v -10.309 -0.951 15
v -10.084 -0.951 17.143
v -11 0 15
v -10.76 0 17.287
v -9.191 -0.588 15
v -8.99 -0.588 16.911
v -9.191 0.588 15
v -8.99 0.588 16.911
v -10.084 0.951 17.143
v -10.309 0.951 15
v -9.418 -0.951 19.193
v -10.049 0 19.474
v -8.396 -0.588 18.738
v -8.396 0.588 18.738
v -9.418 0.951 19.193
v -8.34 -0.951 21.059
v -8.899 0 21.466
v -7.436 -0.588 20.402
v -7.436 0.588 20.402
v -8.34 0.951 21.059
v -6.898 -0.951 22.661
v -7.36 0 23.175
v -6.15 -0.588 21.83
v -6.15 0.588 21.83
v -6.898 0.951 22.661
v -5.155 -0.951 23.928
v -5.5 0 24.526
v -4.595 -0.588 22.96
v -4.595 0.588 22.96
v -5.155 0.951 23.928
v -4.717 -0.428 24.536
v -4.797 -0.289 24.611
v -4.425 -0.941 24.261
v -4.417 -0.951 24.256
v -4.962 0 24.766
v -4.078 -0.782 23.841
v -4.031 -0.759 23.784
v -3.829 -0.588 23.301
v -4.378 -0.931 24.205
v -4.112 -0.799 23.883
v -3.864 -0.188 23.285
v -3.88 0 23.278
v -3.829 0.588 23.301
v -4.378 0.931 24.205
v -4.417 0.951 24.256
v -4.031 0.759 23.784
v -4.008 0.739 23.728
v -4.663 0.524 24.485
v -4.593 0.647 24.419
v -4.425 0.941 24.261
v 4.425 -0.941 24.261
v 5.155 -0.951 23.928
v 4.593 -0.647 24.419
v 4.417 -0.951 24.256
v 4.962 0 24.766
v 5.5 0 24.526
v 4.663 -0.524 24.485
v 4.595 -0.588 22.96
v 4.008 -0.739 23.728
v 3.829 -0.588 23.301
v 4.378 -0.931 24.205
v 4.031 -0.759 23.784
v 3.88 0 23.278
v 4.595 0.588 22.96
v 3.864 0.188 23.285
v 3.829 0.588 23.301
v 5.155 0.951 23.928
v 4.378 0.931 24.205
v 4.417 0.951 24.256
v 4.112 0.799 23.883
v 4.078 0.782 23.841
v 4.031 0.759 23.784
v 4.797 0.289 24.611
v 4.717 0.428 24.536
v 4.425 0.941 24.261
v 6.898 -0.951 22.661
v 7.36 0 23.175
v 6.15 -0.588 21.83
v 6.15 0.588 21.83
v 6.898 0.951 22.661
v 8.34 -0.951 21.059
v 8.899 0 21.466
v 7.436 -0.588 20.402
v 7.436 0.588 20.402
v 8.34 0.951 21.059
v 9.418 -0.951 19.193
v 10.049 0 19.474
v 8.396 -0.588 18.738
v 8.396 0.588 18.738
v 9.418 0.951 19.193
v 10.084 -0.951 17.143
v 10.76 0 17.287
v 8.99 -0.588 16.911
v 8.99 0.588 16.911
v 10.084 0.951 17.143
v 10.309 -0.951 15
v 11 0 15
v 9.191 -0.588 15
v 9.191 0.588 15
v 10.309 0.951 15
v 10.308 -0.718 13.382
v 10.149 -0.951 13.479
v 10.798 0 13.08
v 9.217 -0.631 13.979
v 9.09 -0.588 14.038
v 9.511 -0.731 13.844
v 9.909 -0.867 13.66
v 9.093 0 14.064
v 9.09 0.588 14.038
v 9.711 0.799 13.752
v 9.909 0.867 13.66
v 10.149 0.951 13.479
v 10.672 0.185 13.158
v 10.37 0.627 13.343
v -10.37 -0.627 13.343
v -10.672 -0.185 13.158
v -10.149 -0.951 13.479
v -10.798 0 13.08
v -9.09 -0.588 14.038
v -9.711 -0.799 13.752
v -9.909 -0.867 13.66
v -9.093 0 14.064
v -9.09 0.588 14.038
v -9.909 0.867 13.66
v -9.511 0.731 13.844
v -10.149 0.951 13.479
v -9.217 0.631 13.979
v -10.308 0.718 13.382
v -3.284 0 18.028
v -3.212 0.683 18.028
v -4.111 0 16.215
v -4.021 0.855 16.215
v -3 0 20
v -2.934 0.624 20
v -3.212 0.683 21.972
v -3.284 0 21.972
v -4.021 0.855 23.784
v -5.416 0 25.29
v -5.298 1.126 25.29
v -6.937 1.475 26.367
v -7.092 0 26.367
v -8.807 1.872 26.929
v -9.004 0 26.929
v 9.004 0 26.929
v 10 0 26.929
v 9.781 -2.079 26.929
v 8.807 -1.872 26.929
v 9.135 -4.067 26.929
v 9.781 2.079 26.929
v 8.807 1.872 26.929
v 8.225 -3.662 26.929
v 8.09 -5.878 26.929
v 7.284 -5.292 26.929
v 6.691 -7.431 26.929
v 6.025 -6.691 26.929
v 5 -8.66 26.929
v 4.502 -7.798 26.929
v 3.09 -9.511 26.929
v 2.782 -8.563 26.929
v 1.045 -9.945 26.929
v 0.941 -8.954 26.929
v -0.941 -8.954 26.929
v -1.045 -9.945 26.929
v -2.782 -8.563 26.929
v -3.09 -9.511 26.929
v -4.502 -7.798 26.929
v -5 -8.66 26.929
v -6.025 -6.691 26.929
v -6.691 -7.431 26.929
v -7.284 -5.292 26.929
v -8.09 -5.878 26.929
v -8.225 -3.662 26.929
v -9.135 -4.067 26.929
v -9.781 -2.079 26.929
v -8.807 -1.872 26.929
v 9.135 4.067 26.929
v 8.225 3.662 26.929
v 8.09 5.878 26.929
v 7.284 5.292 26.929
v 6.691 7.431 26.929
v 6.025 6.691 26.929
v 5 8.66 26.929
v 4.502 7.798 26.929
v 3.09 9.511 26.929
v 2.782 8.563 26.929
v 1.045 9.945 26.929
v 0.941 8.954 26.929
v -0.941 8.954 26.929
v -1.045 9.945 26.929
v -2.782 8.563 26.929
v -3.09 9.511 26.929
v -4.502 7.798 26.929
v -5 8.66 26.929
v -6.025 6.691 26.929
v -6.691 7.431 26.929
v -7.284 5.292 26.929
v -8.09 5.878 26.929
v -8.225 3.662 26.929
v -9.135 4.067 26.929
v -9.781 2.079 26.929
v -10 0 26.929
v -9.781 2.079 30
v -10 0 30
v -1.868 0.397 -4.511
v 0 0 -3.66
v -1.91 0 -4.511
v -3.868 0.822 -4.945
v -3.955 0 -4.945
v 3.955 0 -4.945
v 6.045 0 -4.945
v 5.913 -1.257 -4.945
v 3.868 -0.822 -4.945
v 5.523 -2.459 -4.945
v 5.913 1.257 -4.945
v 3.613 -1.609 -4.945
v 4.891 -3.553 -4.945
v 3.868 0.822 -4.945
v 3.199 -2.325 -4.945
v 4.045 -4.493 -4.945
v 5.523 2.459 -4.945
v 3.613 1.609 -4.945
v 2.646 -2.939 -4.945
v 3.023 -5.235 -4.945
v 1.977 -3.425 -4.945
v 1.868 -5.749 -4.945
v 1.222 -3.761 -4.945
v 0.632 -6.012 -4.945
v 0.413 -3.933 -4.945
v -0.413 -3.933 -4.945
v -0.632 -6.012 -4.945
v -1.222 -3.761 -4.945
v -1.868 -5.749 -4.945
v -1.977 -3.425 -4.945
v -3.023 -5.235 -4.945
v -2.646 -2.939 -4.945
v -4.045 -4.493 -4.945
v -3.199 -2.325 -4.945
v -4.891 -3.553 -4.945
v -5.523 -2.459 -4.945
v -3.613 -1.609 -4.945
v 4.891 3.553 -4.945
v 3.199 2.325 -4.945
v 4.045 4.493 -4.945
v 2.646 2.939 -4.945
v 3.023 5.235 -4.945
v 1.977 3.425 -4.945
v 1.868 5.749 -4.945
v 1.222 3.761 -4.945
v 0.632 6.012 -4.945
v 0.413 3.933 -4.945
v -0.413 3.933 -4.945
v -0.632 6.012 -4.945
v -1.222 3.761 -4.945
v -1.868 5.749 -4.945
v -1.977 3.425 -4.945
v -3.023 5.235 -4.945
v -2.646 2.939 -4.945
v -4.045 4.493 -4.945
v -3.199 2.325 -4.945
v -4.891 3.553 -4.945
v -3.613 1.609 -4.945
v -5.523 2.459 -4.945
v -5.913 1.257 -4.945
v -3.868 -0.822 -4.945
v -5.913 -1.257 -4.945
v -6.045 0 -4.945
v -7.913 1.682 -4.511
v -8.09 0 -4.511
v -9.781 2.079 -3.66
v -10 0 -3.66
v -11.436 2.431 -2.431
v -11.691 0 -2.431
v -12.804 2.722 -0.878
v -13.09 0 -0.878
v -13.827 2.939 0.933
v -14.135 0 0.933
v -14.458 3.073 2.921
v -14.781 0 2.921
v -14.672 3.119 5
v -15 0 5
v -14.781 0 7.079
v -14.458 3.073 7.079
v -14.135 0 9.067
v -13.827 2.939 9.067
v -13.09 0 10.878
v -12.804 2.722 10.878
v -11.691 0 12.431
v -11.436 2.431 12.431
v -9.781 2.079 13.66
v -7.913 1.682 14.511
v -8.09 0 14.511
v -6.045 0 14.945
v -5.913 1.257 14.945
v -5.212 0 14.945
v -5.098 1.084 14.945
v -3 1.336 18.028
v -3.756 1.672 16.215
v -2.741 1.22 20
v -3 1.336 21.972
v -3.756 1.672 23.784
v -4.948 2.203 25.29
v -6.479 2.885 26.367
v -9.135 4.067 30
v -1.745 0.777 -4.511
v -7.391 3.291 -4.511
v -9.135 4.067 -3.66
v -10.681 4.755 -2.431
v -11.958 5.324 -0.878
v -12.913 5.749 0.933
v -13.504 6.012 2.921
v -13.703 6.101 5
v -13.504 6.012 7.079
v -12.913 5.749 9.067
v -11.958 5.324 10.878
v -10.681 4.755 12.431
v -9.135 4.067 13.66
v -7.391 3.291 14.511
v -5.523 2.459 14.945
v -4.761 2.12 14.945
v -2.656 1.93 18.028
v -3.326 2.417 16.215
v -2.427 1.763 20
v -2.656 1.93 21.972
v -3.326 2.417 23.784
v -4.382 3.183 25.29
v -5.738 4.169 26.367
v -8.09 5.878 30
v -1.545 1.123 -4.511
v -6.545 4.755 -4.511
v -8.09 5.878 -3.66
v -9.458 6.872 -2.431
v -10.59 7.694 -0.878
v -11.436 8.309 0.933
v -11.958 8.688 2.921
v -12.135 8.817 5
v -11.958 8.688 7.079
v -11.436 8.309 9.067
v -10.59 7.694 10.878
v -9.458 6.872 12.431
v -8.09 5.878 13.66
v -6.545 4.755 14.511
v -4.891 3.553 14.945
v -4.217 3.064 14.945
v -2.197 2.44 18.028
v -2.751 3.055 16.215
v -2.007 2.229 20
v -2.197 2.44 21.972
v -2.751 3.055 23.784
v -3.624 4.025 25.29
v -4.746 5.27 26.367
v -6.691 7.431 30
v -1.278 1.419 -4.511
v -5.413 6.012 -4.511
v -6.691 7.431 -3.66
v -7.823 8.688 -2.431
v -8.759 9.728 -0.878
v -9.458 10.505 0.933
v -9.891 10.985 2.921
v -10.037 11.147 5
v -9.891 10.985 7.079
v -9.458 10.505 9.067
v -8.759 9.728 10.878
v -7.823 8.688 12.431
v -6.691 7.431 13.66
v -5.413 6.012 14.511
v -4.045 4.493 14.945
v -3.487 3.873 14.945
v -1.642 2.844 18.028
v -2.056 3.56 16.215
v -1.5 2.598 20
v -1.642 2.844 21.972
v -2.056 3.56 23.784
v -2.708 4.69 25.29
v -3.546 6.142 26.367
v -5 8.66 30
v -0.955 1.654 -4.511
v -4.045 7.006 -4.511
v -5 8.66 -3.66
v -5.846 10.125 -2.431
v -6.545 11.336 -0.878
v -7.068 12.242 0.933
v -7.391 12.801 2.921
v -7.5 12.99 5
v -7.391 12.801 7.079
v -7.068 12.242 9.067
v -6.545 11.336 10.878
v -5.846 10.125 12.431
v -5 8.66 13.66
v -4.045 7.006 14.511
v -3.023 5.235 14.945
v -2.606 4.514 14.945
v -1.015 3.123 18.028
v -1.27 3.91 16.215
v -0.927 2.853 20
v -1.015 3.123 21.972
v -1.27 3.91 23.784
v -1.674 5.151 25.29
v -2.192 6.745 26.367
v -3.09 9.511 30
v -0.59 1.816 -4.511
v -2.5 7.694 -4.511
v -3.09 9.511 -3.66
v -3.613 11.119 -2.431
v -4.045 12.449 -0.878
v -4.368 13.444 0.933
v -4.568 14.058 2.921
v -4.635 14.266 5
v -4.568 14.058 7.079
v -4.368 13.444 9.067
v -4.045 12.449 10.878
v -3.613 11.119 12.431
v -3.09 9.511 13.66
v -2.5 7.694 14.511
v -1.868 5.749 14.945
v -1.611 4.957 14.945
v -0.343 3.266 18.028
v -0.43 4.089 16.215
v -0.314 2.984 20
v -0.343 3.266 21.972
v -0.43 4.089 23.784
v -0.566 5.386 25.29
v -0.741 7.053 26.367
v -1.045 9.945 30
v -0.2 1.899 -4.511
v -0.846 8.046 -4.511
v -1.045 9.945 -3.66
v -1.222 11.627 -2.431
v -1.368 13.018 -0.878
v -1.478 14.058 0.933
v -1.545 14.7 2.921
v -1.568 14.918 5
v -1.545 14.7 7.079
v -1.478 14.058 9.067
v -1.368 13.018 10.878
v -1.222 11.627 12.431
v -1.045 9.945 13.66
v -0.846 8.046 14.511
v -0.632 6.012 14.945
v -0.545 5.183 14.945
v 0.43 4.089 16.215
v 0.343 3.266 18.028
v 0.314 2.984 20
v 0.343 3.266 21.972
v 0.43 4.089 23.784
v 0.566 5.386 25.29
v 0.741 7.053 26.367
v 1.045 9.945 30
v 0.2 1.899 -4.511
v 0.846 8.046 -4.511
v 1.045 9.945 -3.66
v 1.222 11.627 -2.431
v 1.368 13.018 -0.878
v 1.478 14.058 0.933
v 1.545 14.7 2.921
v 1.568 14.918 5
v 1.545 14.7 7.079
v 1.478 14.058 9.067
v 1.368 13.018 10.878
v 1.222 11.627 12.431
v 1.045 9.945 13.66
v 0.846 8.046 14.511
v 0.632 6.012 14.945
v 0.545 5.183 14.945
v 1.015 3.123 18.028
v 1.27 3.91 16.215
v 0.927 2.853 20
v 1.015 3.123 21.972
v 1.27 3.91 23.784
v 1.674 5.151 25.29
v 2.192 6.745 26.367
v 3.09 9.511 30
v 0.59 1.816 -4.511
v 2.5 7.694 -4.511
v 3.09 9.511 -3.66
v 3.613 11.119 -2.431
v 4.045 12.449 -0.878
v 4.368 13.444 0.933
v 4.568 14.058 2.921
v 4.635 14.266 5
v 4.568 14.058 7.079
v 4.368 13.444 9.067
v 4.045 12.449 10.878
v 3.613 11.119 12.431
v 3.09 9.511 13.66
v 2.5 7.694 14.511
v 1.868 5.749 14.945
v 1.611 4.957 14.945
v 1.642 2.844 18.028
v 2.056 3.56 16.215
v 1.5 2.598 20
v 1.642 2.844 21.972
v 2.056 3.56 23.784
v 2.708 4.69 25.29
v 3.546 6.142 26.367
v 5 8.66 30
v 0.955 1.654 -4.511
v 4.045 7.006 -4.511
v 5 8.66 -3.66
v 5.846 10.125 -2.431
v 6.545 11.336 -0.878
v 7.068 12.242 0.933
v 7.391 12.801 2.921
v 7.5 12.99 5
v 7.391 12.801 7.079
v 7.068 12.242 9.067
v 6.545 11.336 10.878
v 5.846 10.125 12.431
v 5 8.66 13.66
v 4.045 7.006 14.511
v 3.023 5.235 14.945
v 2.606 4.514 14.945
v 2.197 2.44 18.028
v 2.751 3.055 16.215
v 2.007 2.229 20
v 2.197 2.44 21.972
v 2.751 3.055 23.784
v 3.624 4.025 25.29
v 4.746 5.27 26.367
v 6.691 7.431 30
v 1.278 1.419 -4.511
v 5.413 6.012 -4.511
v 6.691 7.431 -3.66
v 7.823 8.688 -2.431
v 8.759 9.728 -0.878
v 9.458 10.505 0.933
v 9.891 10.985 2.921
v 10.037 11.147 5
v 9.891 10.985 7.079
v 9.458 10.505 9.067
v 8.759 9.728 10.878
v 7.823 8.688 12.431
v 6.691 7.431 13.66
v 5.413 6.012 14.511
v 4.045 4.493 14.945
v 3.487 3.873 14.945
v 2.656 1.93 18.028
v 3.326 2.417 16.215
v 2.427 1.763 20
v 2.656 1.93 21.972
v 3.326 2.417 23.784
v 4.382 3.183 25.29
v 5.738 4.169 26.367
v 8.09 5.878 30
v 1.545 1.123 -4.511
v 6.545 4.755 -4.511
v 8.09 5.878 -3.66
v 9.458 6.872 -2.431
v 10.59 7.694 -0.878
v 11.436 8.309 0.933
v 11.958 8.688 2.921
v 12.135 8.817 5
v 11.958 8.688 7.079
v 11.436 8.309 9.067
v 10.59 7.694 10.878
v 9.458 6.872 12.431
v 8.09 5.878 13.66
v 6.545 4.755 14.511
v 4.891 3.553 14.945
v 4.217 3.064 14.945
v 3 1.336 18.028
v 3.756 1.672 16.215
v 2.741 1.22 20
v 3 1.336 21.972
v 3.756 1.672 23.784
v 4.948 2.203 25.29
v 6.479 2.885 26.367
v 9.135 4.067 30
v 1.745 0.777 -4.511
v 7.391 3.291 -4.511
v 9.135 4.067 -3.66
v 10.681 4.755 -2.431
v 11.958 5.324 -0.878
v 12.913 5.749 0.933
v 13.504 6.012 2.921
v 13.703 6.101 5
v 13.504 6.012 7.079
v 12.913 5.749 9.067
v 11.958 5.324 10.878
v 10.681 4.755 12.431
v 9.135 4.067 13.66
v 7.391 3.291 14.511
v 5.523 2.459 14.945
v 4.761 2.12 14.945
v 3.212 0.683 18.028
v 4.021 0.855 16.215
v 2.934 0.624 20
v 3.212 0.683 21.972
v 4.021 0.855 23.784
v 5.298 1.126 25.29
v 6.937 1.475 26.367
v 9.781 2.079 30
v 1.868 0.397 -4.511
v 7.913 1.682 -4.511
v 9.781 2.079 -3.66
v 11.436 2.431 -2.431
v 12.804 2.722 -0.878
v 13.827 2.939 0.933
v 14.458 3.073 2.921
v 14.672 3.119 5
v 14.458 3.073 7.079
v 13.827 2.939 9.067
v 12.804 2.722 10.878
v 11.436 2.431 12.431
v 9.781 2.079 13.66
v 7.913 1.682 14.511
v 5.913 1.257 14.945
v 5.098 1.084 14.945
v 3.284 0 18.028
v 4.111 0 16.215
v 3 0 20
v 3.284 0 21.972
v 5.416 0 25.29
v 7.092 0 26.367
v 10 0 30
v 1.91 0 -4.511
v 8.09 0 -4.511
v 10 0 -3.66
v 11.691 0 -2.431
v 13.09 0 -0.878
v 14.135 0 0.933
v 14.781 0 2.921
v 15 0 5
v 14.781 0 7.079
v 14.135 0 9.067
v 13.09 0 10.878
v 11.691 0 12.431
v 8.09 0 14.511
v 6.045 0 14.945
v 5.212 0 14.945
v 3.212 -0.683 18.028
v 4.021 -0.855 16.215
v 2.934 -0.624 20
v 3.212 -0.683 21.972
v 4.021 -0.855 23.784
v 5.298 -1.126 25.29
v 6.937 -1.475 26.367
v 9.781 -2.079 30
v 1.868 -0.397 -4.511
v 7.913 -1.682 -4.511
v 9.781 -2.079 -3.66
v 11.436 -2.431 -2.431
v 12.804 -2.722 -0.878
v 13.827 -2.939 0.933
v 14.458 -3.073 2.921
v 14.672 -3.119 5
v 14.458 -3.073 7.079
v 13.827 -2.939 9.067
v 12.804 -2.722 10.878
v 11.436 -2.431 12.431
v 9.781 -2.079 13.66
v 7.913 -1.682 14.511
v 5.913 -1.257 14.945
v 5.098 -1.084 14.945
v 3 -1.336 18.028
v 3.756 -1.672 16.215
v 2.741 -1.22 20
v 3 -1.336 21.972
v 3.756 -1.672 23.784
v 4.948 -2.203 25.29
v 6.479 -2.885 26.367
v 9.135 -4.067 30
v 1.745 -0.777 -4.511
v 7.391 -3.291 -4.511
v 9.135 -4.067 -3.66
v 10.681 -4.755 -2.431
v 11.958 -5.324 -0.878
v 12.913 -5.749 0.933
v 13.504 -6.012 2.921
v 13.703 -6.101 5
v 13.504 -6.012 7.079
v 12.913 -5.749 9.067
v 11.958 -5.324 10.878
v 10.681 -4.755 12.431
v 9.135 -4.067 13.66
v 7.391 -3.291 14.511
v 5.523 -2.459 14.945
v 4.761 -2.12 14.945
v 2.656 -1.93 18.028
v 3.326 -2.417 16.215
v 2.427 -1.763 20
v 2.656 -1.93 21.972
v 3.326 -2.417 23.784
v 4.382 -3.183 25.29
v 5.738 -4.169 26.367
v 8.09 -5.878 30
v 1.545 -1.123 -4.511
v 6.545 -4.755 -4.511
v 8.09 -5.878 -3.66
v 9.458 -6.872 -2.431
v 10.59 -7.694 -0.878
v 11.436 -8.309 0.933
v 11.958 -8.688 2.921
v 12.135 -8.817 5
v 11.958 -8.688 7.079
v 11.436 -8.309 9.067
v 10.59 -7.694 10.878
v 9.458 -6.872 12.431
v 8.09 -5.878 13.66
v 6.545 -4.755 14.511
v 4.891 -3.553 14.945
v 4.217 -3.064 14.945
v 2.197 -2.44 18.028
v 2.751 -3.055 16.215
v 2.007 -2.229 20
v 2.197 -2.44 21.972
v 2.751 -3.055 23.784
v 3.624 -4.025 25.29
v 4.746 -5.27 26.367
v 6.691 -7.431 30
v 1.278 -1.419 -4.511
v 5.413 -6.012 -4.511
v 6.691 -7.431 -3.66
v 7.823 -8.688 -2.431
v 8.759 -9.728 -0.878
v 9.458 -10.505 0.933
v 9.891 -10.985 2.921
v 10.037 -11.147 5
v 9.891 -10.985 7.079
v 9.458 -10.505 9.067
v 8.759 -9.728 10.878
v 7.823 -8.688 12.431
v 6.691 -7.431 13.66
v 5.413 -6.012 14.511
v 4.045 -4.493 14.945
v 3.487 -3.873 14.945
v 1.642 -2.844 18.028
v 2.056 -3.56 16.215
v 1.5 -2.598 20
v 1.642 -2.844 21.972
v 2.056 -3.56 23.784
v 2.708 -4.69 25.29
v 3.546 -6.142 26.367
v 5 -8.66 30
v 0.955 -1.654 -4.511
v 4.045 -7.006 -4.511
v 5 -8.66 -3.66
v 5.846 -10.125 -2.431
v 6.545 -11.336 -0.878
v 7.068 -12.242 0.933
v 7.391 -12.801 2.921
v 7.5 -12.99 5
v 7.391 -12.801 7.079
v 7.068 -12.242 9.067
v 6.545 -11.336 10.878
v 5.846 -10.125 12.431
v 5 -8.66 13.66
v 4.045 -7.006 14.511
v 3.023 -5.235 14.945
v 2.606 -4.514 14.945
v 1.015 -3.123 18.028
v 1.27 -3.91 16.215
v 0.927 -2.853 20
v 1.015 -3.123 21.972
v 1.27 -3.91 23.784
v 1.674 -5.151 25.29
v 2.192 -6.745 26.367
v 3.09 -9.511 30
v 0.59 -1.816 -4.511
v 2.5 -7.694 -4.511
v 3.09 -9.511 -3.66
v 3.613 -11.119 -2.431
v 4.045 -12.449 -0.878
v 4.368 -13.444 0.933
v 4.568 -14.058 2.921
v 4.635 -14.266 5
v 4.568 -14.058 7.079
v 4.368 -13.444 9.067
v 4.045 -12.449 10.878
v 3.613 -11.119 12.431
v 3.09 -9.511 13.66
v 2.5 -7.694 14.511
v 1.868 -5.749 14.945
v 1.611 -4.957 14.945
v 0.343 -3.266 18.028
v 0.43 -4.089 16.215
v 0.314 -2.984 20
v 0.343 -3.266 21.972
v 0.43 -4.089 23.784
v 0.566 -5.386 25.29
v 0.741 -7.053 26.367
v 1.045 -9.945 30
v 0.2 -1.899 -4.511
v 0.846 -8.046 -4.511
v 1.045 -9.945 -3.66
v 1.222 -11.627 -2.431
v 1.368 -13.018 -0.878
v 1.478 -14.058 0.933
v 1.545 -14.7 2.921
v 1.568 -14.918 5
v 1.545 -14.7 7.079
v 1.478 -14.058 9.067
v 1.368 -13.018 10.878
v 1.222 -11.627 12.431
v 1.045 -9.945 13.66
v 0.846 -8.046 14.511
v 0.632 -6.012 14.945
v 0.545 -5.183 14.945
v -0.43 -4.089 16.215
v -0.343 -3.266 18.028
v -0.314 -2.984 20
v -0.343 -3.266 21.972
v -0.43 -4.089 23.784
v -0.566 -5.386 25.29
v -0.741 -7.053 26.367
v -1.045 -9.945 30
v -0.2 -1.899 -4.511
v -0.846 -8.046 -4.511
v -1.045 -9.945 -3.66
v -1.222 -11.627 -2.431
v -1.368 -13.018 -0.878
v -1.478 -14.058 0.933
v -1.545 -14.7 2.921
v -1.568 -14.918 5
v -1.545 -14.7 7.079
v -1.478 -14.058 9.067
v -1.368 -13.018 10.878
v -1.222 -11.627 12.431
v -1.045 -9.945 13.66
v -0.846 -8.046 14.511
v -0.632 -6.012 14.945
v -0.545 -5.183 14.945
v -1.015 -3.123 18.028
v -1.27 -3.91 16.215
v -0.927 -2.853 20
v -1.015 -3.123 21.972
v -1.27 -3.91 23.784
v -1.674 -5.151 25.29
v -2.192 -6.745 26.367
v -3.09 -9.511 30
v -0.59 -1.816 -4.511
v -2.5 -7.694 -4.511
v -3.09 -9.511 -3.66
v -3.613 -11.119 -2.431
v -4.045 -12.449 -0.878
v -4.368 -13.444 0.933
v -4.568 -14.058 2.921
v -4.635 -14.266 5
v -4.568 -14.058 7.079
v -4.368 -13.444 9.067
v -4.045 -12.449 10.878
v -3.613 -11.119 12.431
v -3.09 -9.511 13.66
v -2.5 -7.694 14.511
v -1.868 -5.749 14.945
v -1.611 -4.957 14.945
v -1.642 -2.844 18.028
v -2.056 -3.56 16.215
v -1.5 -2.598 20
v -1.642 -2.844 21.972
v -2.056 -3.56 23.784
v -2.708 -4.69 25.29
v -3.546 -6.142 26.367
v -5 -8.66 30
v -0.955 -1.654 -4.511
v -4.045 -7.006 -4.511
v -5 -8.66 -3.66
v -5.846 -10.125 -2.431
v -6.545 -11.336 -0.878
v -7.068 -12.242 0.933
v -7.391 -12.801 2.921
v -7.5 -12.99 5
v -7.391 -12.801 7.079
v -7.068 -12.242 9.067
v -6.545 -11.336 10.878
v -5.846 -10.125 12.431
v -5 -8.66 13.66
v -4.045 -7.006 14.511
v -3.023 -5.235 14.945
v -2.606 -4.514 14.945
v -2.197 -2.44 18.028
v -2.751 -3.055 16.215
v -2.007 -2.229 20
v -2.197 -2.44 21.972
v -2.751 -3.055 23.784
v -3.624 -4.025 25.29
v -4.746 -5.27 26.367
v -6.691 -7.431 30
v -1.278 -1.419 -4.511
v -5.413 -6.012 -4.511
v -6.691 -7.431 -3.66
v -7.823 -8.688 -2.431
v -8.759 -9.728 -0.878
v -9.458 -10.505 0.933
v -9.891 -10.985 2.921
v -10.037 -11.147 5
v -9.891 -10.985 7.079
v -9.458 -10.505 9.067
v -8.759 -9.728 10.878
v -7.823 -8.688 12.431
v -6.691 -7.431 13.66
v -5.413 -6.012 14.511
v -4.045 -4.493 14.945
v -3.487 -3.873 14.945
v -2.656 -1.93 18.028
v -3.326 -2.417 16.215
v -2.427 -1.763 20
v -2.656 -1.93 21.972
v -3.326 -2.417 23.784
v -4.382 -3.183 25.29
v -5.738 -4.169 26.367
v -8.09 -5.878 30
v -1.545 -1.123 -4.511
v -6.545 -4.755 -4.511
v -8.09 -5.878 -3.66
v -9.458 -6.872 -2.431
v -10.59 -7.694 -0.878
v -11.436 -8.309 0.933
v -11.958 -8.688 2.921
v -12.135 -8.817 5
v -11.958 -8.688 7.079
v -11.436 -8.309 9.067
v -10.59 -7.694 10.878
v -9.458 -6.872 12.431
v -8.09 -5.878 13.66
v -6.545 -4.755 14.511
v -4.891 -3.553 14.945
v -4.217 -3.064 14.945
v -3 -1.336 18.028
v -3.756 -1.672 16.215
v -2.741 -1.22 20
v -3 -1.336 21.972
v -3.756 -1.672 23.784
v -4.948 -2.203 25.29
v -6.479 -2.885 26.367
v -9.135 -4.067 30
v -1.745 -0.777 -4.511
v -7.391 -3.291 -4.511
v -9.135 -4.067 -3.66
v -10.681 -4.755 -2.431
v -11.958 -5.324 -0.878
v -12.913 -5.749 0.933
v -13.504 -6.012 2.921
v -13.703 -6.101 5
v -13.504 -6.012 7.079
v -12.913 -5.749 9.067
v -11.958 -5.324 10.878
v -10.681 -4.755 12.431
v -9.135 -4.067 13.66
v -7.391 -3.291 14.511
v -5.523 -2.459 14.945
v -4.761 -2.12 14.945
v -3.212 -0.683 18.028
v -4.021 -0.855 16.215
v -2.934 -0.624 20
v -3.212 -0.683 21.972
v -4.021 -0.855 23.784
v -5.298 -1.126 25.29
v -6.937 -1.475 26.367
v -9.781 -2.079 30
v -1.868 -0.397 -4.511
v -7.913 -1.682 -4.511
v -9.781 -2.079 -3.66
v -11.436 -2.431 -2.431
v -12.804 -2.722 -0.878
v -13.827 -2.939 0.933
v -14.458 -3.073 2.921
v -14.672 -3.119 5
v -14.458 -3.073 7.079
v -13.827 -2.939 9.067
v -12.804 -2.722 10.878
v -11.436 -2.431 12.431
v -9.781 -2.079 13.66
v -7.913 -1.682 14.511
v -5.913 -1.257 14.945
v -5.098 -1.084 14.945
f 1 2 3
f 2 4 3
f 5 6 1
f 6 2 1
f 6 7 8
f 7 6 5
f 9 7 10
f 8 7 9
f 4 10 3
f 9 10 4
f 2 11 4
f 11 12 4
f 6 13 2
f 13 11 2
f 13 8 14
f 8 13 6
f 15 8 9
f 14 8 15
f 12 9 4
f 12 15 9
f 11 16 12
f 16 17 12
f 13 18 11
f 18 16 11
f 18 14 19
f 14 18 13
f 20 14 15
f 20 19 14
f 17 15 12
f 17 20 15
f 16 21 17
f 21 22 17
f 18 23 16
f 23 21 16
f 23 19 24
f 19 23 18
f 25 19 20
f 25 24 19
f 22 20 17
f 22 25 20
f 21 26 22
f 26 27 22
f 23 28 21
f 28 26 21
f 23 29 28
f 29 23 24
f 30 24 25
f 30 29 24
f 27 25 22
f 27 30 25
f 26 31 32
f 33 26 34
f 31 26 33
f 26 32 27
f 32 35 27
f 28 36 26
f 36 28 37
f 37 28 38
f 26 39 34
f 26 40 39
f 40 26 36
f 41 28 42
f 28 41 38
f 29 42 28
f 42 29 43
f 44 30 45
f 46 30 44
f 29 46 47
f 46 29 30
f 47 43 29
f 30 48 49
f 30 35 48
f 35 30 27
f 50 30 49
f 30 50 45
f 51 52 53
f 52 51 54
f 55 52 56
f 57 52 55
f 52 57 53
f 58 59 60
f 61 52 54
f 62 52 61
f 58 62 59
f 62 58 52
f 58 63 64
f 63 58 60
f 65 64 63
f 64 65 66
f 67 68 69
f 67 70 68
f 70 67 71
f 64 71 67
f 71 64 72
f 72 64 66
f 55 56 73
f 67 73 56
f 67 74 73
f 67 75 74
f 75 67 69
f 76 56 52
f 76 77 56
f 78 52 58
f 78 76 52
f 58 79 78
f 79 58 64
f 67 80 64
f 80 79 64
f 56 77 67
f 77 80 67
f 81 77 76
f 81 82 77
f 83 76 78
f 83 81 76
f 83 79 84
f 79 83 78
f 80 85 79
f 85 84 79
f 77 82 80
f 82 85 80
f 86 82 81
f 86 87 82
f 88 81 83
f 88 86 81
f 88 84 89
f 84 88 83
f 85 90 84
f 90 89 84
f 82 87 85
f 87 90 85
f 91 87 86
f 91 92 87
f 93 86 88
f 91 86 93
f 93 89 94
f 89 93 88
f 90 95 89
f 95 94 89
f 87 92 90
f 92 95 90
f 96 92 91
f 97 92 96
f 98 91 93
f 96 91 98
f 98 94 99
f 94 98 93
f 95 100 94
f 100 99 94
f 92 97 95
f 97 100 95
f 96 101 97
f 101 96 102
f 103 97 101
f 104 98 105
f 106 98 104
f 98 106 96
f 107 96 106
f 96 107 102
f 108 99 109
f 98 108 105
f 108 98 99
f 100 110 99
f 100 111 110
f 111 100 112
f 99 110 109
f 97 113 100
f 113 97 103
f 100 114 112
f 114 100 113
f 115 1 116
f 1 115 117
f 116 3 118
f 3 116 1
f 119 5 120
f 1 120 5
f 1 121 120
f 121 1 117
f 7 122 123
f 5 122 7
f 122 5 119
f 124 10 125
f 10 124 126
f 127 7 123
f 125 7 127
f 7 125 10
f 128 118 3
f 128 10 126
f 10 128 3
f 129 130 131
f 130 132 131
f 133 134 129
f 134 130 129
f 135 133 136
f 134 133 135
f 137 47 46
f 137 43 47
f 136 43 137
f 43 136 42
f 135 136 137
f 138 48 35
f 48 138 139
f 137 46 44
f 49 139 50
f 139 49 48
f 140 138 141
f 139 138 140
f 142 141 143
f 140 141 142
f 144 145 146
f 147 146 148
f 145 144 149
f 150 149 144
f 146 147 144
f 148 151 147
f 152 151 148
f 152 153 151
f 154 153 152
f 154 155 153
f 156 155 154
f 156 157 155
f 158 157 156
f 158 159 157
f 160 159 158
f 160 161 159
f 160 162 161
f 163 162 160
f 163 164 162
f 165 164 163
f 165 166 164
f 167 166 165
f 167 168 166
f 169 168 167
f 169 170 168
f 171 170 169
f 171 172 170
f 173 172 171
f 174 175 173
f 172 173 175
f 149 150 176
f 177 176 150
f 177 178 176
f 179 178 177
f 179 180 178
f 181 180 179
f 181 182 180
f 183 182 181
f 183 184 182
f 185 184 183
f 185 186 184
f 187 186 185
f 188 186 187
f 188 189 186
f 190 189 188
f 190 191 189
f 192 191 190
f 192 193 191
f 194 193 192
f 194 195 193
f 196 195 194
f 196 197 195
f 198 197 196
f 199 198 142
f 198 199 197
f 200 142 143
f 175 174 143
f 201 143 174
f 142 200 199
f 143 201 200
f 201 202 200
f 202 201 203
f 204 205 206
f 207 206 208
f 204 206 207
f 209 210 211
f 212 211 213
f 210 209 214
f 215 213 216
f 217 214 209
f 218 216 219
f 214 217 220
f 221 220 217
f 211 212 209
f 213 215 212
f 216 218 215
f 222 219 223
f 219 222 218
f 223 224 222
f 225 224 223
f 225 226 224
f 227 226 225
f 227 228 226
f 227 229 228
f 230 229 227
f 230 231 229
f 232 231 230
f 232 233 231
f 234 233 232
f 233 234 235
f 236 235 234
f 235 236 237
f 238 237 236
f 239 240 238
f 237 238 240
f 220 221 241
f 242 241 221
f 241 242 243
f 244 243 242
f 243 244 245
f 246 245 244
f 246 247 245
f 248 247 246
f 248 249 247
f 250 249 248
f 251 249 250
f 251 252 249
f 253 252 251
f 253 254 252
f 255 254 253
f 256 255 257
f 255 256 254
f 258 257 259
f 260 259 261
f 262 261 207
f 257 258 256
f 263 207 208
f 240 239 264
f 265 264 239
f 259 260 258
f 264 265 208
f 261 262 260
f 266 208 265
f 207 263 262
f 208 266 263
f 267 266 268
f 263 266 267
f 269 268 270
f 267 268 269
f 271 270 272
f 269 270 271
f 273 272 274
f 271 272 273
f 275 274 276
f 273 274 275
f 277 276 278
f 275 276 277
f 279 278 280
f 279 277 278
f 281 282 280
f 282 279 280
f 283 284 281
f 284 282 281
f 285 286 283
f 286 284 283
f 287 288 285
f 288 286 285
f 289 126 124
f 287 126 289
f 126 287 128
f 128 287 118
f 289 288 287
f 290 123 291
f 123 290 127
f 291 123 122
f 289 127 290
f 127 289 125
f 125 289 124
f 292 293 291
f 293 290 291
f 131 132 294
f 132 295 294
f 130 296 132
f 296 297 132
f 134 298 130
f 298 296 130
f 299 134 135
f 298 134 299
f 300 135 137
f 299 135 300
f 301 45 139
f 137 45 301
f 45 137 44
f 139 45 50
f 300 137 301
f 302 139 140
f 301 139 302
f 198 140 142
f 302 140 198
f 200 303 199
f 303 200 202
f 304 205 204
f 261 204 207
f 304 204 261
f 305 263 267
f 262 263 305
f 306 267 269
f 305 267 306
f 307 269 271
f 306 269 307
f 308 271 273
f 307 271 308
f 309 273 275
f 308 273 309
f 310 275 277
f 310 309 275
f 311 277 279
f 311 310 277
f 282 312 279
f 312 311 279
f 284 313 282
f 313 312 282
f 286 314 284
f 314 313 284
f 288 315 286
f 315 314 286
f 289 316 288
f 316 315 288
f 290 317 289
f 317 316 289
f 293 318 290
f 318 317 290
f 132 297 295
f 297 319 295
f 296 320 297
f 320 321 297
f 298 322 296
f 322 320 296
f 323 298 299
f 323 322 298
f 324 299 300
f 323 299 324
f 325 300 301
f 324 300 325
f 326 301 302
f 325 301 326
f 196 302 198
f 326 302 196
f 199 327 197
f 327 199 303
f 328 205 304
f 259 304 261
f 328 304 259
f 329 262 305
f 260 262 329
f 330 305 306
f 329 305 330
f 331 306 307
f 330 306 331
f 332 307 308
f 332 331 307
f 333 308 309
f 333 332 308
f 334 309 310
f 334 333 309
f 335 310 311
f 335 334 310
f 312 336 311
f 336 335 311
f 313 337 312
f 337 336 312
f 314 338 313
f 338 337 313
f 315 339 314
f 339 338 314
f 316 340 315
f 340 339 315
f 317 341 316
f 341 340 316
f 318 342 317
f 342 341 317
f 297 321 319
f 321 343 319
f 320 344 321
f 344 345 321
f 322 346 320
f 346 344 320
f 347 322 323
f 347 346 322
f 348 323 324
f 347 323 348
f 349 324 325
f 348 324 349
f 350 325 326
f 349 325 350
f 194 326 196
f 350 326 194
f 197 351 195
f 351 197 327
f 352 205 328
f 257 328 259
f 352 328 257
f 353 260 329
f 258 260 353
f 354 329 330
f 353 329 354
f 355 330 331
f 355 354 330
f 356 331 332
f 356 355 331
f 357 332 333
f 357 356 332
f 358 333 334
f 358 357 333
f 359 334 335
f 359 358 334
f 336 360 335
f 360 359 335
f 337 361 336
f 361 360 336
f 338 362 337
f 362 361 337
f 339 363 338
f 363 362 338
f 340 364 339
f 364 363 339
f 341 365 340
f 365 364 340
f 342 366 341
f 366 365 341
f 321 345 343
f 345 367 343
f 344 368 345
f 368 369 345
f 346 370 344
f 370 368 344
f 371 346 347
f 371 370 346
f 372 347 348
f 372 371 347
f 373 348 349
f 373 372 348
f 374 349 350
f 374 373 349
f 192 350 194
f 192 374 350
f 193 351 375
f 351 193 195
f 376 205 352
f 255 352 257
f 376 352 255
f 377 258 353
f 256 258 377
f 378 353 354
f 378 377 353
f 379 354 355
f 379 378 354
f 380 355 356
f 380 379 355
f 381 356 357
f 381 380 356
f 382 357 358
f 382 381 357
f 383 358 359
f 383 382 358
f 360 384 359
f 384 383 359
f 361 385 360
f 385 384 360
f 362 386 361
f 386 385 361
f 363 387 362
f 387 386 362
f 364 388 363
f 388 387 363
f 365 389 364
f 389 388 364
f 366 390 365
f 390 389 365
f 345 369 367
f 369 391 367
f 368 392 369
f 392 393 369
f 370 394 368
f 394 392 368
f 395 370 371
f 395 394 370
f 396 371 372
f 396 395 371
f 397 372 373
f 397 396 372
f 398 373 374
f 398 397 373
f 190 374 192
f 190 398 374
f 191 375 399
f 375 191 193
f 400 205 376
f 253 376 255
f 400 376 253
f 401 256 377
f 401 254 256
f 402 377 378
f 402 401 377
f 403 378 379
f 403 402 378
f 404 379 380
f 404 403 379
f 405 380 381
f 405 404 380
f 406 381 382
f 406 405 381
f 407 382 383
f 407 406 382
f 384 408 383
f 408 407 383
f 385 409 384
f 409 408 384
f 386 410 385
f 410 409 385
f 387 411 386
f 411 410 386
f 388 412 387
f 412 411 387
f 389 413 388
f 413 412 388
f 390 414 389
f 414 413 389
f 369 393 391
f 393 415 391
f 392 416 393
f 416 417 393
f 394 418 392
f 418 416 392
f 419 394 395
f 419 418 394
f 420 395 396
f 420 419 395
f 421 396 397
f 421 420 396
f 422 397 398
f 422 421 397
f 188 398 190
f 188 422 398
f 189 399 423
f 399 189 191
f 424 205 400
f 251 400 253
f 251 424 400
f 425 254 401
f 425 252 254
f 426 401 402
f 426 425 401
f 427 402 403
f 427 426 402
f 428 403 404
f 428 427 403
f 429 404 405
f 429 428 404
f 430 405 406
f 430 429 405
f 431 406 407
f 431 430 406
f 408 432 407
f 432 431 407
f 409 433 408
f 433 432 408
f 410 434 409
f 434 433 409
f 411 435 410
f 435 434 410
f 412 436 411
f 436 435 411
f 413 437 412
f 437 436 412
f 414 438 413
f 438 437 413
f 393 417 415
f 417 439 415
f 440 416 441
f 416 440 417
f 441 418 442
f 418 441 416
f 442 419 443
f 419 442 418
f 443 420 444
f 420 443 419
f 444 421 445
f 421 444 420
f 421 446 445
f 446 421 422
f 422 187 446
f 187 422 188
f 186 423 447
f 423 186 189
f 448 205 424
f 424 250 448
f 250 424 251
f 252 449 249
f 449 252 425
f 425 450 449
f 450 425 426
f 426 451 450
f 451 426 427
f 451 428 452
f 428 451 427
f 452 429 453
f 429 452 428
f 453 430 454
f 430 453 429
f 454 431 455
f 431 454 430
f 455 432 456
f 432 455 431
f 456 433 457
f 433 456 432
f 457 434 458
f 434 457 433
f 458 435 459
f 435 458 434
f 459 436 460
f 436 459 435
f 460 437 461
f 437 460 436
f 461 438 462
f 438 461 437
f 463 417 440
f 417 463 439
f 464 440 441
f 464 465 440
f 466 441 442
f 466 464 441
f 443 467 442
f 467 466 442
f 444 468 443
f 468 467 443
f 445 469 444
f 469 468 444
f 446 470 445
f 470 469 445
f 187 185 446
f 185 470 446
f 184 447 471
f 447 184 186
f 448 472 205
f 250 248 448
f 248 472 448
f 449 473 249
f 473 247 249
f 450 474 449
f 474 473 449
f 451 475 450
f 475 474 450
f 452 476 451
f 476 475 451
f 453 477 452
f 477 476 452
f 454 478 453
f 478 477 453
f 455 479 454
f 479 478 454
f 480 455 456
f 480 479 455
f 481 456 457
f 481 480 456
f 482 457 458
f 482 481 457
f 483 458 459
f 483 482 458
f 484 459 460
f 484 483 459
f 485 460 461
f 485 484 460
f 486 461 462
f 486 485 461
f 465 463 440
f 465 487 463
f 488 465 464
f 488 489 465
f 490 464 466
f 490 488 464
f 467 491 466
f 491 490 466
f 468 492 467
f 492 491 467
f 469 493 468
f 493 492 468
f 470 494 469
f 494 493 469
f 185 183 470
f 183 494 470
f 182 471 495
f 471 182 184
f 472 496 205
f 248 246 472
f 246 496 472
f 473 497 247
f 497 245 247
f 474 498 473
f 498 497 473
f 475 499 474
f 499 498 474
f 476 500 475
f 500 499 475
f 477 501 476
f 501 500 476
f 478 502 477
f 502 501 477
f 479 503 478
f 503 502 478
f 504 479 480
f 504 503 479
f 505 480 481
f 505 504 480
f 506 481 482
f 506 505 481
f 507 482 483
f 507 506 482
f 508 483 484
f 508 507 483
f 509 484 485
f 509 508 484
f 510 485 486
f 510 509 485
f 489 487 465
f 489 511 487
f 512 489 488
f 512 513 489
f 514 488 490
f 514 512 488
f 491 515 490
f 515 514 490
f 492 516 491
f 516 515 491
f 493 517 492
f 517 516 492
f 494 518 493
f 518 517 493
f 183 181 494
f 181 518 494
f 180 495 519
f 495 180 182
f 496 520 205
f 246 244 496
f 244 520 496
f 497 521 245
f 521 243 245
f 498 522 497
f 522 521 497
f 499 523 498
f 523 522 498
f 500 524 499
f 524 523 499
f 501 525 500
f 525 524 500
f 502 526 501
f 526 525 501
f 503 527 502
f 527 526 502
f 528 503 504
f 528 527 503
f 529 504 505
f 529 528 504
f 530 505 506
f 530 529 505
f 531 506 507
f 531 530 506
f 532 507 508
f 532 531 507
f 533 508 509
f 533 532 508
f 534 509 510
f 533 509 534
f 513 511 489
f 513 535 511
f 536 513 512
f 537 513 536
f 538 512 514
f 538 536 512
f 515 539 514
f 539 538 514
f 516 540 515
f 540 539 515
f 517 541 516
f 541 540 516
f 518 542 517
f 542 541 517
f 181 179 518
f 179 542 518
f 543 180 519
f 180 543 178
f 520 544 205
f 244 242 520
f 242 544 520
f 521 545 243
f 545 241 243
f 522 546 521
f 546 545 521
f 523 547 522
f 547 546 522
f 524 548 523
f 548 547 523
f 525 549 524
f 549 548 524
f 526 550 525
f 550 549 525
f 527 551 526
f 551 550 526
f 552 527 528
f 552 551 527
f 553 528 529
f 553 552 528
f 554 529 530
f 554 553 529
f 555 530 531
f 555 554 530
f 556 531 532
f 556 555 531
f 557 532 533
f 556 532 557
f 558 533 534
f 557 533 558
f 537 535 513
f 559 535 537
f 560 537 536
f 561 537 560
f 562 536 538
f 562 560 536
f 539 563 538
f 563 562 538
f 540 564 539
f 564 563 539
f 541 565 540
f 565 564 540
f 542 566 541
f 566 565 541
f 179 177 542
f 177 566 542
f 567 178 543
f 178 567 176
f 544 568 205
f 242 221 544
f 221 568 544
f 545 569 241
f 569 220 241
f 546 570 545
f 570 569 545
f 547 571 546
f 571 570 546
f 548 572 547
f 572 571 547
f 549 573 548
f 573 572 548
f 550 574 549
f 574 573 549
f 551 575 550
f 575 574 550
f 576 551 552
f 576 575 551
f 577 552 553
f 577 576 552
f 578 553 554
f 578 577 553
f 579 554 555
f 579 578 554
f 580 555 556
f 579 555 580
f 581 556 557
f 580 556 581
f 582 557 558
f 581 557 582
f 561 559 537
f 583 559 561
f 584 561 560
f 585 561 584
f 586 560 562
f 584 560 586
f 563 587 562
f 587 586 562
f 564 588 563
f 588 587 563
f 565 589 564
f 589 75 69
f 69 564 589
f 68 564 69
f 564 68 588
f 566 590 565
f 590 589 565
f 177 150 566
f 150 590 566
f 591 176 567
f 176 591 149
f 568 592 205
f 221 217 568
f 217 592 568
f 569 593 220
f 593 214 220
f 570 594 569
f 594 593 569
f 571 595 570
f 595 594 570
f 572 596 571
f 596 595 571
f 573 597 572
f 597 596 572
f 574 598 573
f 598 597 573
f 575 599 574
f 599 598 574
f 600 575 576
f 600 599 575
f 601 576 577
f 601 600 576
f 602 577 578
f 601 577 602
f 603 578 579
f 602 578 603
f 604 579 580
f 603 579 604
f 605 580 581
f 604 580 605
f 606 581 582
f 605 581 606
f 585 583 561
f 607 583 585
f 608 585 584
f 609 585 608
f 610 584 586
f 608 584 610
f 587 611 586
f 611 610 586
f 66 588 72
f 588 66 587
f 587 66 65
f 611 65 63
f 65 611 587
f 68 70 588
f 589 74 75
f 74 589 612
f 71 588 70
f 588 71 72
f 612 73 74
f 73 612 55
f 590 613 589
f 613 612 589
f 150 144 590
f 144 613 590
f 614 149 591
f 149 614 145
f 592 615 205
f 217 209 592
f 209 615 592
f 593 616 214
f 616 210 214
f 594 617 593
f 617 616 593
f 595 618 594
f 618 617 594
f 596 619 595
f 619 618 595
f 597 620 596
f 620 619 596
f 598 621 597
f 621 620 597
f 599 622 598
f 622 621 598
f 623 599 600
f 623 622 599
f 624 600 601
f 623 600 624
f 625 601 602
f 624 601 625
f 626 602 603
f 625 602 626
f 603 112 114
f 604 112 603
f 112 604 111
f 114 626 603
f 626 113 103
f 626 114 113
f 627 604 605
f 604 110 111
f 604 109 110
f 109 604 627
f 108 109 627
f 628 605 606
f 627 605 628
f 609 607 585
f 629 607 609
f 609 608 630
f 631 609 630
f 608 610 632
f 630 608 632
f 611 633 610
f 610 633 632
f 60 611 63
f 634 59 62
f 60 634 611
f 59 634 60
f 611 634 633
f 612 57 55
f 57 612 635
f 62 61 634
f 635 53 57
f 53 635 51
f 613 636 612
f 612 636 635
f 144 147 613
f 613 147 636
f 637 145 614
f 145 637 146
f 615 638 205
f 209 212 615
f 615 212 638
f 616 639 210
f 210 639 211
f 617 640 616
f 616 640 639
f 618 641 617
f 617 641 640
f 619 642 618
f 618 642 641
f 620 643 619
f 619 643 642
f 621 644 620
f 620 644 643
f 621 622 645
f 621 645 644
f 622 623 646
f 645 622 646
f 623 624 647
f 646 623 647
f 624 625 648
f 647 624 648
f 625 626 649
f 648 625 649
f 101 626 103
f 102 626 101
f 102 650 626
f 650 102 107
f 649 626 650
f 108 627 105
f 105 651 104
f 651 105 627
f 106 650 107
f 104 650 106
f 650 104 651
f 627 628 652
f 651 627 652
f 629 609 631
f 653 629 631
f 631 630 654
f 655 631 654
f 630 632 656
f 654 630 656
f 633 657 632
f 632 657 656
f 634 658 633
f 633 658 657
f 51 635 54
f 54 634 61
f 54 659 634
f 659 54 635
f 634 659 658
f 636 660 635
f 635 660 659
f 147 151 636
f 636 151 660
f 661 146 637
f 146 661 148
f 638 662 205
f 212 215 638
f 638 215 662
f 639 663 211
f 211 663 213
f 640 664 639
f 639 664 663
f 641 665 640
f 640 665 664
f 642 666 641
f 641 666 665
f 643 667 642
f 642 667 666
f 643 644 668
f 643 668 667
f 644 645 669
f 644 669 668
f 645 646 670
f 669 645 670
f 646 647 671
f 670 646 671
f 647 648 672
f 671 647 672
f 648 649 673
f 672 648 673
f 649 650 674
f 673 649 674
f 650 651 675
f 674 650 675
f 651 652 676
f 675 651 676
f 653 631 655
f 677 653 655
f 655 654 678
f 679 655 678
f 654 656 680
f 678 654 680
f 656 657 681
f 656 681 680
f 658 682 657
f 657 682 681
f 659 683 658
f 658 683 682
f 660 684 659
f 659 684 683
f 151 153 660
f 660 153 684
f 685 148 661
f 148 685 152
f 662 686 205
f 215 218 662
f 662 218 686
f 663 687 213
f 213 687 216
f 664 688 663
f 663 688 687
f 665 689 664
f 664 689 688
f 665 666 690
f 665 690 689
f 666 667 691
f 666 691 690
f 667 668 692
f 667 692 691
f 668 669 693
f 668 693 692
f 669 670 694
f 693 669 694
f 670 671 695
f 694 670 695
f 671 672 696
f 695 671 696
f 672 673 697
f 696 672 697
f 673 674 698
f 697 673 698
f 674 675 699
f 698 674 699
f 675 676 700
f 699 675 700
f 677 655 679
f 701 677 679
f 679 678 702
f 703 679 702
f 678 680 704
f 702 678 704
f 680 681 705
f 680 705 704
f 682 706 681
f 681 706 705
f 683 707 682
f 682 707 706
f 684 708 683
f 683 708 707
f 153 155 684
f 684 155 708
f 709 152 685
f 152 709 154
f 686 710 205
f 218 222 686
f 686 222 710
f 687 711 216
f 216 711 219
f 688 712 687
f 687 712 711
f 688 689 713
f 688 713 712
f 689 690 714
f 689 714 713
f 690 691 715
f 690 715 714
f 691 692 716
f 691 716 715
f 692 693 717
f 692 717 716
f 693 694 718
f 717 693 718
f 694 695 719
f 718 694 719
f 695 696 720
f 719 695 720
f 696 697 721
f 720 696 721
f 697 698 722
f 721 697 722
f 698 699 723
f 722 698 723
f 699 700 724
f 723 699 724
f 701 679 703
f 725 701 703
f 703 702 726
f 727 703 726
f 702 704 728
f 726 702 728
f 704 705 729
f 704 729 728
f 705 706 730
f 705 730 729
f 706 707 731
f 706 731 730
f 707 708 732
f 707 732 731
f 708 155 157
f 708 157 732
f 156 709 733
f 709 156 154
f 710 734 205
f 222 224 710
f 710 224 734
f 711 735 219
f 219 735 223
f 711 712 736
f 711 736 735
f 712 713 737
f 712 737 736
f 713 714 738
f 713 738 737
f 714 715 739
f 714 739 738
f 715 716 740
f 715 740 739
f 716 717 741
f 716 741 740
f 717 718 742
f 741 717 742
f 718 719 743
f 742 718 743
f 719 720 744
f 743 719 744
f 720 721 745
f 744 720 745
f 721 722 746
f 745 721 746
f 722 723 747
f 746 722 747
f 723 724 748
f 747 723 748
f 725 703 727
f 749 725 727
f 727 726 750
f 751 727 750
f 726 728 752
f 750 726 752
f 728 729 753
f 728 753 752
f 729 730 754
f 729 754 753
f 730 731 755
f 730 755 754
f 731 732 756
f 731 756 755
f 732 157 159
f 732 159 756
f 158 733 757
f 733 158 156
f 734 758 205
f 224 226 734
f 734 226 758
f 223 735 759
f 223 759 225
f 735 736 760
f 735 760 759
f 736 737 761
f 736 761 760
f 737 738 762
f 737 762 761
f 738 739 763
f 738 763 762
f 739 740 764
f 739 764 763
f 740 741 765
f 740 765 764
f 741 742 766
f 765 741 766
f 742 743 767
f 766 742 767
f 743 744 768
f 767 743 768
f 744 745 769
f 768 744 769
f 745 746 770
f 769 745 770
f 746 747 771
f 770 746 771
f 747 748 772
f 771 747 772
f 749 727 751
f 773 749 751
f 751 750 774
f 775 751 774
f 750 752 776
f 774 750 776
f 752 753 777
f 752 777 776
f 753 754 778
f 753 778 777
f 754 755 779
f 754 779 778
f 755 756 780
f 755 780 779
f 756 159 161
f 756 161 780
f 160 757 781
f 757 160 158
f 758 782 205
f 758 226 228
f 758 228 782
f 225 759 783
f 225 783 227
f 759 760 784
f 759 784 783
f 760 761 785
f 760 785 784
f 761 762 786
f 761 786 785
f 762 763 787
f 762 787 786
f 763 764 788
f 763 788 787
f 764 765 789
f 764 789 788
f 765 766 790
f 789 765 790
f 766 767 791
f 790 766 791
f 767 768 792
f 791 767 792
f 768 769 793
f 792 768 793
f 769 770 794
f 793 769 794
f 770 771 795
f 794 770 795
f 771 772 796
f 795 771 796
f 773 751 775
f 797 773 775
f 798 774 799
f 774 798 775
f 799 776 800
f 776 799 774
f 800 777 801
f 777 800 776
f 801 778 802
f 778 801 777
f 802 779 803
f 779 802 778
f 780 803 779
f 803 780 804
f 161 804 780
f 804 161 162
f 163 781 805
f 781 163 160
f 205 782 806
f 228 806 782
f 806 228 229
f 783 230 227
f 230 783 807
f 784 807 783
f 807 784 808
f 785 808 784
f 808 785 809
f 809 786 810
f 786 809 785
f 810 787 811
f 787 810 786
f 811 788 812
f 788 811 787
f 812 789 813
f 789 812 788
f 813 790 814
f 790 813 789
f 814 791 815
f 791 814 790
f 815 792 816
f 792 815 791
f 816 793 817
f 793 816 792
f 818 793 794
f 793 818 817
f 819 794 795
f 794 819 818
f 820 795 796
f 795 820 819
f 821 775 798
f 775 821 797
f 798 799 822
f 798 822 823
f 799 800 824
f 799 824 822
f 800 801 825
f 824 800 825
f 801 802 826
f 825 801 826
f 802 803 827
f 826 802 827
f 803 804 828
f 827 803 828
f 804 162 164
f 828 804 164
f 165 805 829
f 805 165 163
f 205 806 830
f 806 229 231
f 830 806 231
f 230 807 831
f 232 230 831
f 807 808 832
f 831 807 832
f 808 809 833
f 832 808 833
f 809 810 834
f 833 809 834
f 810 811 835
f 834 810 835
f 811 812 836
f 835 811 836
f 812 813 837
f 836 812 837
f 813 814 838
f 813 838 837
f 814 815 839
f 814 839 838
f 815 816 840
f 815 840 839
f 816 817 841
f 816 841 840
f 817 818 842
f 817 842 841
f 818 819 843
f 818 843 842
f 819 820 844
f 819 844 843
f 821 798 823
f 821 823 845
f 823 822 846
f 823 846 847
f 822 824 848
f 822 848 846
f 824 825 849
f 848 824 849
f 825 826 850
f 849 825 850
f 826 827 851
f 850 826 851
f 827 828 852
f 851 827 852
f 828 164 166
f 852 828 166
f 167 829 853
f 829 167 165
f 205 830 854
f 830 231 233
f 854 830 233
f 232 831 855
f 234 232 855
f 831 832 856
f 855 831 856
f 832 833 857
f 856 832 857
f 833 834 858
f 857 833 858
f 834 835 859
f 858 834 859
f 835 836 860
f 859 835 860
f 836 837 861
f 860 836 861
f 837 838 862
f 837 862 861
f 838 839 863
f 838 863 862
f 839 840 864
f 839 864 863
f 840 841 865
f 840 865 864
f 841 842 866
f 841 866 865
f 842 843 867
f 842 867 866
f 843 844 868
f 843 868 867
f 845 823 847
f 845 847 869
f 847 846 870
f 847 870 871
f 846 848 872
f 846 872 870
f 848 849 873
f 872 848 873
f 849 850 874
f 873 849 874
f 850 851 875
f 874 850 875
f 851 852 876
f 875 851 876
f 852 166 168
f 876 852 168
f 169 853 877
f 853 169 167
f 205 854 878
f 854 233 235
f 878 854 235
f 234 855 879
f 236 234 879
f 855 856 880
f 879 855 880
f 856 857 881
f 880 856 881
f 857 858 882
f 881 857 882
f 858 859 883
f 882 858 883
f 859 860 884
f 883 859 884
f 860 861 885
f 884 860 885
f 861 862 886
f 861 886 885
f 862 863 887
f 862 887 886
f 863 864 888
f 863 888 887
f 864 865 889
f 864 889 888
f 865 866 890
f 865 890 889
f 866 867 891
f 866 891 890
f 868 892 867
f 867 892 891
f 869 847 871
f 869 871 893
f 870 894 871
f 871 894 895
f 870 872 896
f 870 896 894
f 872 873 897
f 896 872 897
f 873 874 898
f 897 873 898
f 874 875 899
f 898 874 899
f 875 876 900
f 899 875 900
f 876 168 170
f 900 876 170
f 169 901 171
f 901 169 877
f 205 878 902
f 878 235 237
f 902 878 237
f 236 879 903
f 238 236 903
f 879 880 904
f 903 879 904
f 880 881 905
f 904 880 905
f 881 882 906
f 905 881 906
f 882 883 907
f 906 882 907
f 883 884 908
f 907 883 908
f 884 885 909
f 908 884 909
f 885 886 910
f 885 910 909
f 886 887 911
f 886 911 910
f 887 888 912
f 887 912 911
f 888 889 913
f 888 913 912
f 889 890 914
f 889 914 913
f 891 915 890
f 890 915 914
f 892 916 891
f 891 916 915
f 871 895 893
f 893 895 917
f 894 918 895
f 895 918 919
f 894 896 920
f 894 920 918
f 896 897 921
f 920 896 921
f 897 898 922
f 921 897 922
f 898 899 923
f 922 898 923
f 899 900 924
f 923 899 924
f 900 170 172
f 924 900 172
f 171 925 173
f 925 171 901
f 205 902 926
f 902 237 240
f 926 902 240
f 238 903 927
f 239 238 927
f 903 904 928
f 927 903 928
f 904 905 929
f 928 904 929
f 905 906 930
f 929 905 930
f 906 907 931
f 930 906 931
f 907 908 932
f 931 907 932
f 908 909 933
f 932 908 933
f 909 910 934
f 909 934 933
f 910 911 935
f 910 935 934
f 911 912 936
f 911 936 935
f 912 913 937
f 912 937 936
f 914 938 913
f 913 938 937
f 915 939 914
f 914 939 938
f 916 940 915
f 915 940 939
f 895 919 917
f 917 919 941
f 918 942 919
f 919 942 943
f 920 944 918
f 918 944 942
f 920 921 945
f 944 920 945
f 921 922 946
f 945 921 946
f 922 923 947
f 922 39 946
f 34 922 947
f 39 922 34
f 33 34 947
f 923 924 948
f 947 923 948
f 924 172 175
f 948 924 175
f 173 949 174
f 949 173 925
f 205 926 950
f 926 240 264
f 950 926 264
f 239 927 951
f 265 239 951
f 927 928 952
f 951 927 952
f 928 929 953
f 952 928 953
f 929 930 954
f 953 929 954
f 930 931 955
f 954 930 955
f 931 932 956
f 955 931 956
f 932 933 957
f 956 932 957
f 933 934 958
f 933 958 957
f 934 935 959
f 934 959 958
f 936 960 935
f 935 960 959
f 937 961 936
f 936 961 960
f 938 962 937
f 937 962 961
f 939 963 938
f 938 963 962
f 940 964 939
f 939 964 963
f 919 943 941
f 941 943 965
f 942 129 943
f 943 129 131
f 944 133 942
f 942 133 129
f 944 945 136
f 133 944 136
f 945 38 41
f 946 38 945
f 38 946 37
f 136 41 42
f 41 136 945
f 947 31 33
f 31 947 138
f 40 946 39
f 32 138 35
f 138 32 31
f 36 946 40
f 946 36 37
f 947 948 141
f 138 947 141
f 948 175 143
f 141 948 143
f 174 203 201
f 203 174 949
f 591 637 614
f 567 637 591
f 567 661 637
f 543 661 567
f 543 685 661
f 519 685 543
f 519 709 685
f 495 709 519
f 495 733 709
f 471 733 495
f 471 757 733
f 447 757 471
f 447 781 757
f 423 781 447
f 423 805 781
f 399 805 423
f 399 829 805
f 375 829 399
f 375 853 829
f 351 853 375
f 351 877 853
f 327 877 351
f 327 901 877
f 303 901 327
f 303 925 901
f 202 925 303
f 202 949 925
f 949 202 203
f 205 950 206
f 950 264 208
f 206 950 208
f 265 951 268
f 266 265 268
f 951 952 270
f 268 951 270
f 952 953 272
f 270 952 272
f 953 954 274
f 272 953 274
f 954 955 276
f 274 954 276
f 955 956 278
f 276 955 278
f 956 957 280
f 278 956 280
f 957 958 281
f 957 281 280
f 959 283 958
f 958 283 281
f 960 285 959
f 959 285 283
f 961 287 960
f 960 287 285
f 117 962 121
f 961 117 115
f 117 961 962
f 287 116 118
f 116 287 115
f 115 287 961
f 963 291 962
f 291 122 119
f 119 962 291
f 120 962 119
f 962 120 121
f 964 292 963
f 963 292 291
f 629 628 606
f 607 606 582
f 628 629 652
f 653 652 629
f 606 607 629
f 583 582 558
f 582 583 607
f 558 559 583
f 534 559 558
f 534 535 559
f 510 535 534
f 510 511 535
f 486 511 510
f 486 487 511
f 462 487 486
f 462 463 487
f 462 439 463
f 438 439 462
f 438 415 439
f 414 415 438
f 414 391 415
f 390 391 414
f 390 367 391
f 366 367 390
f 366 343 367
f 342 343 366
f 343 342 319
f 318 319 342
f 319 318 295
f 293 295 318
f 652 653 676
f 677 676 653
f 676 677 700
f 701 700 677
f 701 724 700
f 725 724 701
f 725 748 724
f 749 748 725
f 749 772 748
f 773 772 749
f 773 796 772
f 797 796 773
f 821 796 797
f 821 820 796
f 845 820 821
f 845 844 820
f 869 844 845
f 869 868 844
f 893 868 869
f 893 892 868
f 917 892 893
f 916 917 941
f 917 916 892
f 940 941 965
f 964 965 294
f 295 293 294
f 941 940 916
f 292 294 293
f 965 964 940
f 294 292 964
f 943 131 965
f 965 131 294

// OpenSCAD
// [FL_INDEX: keywords="openscad, 3d_parametric, Parametric_Vase, csg_solid" | COT="Parametric OpenSCAD design from 3DCodeverse"]
// Title: Parametric Vase

// preview[view:south, tilt:side]


/*
*
*	Creator: Meiying Cheung
*	MCP-lab: http://hci.rwth-aachen.de/mcp
*	It draws a Vase
*
*/

/* [Parameters] */
//it changes the radio of the lower part:   
radio_body = 0;//[0:5]
//resize the hole figure but it may deform it:   
resize = 10;//[5.1:18.1]
//it changes the thick of the Vase:  
neck = 0;//[0:1]

/* [Hidden] */
union(){

	//handlers
	translate([0,0,15])rotate([90,0,0])rotate_extrude(convexity = 10)
	translate([resize, 0, 0])
	circle(r = 1);
	//

	//main body
	rotate_extrude(convexity = 10)
	union(){
		union()
		{
			difference()
			{
				difference()
				{
					square([resize,resize+resize*2]);
					translate([resize,resize*2,0])circle(r=resize*0.7-neck);
				}

				translate([5,5,0])
				circle(r=resize+radio_body);
			}
			intersection(){
			translate([5,5,0])
			circle(r=resize+radio_body);
			translate([0,-5,0])square([2*resize+radio_body,2*resize+radio_body]);
			}
		}	

	}

}
